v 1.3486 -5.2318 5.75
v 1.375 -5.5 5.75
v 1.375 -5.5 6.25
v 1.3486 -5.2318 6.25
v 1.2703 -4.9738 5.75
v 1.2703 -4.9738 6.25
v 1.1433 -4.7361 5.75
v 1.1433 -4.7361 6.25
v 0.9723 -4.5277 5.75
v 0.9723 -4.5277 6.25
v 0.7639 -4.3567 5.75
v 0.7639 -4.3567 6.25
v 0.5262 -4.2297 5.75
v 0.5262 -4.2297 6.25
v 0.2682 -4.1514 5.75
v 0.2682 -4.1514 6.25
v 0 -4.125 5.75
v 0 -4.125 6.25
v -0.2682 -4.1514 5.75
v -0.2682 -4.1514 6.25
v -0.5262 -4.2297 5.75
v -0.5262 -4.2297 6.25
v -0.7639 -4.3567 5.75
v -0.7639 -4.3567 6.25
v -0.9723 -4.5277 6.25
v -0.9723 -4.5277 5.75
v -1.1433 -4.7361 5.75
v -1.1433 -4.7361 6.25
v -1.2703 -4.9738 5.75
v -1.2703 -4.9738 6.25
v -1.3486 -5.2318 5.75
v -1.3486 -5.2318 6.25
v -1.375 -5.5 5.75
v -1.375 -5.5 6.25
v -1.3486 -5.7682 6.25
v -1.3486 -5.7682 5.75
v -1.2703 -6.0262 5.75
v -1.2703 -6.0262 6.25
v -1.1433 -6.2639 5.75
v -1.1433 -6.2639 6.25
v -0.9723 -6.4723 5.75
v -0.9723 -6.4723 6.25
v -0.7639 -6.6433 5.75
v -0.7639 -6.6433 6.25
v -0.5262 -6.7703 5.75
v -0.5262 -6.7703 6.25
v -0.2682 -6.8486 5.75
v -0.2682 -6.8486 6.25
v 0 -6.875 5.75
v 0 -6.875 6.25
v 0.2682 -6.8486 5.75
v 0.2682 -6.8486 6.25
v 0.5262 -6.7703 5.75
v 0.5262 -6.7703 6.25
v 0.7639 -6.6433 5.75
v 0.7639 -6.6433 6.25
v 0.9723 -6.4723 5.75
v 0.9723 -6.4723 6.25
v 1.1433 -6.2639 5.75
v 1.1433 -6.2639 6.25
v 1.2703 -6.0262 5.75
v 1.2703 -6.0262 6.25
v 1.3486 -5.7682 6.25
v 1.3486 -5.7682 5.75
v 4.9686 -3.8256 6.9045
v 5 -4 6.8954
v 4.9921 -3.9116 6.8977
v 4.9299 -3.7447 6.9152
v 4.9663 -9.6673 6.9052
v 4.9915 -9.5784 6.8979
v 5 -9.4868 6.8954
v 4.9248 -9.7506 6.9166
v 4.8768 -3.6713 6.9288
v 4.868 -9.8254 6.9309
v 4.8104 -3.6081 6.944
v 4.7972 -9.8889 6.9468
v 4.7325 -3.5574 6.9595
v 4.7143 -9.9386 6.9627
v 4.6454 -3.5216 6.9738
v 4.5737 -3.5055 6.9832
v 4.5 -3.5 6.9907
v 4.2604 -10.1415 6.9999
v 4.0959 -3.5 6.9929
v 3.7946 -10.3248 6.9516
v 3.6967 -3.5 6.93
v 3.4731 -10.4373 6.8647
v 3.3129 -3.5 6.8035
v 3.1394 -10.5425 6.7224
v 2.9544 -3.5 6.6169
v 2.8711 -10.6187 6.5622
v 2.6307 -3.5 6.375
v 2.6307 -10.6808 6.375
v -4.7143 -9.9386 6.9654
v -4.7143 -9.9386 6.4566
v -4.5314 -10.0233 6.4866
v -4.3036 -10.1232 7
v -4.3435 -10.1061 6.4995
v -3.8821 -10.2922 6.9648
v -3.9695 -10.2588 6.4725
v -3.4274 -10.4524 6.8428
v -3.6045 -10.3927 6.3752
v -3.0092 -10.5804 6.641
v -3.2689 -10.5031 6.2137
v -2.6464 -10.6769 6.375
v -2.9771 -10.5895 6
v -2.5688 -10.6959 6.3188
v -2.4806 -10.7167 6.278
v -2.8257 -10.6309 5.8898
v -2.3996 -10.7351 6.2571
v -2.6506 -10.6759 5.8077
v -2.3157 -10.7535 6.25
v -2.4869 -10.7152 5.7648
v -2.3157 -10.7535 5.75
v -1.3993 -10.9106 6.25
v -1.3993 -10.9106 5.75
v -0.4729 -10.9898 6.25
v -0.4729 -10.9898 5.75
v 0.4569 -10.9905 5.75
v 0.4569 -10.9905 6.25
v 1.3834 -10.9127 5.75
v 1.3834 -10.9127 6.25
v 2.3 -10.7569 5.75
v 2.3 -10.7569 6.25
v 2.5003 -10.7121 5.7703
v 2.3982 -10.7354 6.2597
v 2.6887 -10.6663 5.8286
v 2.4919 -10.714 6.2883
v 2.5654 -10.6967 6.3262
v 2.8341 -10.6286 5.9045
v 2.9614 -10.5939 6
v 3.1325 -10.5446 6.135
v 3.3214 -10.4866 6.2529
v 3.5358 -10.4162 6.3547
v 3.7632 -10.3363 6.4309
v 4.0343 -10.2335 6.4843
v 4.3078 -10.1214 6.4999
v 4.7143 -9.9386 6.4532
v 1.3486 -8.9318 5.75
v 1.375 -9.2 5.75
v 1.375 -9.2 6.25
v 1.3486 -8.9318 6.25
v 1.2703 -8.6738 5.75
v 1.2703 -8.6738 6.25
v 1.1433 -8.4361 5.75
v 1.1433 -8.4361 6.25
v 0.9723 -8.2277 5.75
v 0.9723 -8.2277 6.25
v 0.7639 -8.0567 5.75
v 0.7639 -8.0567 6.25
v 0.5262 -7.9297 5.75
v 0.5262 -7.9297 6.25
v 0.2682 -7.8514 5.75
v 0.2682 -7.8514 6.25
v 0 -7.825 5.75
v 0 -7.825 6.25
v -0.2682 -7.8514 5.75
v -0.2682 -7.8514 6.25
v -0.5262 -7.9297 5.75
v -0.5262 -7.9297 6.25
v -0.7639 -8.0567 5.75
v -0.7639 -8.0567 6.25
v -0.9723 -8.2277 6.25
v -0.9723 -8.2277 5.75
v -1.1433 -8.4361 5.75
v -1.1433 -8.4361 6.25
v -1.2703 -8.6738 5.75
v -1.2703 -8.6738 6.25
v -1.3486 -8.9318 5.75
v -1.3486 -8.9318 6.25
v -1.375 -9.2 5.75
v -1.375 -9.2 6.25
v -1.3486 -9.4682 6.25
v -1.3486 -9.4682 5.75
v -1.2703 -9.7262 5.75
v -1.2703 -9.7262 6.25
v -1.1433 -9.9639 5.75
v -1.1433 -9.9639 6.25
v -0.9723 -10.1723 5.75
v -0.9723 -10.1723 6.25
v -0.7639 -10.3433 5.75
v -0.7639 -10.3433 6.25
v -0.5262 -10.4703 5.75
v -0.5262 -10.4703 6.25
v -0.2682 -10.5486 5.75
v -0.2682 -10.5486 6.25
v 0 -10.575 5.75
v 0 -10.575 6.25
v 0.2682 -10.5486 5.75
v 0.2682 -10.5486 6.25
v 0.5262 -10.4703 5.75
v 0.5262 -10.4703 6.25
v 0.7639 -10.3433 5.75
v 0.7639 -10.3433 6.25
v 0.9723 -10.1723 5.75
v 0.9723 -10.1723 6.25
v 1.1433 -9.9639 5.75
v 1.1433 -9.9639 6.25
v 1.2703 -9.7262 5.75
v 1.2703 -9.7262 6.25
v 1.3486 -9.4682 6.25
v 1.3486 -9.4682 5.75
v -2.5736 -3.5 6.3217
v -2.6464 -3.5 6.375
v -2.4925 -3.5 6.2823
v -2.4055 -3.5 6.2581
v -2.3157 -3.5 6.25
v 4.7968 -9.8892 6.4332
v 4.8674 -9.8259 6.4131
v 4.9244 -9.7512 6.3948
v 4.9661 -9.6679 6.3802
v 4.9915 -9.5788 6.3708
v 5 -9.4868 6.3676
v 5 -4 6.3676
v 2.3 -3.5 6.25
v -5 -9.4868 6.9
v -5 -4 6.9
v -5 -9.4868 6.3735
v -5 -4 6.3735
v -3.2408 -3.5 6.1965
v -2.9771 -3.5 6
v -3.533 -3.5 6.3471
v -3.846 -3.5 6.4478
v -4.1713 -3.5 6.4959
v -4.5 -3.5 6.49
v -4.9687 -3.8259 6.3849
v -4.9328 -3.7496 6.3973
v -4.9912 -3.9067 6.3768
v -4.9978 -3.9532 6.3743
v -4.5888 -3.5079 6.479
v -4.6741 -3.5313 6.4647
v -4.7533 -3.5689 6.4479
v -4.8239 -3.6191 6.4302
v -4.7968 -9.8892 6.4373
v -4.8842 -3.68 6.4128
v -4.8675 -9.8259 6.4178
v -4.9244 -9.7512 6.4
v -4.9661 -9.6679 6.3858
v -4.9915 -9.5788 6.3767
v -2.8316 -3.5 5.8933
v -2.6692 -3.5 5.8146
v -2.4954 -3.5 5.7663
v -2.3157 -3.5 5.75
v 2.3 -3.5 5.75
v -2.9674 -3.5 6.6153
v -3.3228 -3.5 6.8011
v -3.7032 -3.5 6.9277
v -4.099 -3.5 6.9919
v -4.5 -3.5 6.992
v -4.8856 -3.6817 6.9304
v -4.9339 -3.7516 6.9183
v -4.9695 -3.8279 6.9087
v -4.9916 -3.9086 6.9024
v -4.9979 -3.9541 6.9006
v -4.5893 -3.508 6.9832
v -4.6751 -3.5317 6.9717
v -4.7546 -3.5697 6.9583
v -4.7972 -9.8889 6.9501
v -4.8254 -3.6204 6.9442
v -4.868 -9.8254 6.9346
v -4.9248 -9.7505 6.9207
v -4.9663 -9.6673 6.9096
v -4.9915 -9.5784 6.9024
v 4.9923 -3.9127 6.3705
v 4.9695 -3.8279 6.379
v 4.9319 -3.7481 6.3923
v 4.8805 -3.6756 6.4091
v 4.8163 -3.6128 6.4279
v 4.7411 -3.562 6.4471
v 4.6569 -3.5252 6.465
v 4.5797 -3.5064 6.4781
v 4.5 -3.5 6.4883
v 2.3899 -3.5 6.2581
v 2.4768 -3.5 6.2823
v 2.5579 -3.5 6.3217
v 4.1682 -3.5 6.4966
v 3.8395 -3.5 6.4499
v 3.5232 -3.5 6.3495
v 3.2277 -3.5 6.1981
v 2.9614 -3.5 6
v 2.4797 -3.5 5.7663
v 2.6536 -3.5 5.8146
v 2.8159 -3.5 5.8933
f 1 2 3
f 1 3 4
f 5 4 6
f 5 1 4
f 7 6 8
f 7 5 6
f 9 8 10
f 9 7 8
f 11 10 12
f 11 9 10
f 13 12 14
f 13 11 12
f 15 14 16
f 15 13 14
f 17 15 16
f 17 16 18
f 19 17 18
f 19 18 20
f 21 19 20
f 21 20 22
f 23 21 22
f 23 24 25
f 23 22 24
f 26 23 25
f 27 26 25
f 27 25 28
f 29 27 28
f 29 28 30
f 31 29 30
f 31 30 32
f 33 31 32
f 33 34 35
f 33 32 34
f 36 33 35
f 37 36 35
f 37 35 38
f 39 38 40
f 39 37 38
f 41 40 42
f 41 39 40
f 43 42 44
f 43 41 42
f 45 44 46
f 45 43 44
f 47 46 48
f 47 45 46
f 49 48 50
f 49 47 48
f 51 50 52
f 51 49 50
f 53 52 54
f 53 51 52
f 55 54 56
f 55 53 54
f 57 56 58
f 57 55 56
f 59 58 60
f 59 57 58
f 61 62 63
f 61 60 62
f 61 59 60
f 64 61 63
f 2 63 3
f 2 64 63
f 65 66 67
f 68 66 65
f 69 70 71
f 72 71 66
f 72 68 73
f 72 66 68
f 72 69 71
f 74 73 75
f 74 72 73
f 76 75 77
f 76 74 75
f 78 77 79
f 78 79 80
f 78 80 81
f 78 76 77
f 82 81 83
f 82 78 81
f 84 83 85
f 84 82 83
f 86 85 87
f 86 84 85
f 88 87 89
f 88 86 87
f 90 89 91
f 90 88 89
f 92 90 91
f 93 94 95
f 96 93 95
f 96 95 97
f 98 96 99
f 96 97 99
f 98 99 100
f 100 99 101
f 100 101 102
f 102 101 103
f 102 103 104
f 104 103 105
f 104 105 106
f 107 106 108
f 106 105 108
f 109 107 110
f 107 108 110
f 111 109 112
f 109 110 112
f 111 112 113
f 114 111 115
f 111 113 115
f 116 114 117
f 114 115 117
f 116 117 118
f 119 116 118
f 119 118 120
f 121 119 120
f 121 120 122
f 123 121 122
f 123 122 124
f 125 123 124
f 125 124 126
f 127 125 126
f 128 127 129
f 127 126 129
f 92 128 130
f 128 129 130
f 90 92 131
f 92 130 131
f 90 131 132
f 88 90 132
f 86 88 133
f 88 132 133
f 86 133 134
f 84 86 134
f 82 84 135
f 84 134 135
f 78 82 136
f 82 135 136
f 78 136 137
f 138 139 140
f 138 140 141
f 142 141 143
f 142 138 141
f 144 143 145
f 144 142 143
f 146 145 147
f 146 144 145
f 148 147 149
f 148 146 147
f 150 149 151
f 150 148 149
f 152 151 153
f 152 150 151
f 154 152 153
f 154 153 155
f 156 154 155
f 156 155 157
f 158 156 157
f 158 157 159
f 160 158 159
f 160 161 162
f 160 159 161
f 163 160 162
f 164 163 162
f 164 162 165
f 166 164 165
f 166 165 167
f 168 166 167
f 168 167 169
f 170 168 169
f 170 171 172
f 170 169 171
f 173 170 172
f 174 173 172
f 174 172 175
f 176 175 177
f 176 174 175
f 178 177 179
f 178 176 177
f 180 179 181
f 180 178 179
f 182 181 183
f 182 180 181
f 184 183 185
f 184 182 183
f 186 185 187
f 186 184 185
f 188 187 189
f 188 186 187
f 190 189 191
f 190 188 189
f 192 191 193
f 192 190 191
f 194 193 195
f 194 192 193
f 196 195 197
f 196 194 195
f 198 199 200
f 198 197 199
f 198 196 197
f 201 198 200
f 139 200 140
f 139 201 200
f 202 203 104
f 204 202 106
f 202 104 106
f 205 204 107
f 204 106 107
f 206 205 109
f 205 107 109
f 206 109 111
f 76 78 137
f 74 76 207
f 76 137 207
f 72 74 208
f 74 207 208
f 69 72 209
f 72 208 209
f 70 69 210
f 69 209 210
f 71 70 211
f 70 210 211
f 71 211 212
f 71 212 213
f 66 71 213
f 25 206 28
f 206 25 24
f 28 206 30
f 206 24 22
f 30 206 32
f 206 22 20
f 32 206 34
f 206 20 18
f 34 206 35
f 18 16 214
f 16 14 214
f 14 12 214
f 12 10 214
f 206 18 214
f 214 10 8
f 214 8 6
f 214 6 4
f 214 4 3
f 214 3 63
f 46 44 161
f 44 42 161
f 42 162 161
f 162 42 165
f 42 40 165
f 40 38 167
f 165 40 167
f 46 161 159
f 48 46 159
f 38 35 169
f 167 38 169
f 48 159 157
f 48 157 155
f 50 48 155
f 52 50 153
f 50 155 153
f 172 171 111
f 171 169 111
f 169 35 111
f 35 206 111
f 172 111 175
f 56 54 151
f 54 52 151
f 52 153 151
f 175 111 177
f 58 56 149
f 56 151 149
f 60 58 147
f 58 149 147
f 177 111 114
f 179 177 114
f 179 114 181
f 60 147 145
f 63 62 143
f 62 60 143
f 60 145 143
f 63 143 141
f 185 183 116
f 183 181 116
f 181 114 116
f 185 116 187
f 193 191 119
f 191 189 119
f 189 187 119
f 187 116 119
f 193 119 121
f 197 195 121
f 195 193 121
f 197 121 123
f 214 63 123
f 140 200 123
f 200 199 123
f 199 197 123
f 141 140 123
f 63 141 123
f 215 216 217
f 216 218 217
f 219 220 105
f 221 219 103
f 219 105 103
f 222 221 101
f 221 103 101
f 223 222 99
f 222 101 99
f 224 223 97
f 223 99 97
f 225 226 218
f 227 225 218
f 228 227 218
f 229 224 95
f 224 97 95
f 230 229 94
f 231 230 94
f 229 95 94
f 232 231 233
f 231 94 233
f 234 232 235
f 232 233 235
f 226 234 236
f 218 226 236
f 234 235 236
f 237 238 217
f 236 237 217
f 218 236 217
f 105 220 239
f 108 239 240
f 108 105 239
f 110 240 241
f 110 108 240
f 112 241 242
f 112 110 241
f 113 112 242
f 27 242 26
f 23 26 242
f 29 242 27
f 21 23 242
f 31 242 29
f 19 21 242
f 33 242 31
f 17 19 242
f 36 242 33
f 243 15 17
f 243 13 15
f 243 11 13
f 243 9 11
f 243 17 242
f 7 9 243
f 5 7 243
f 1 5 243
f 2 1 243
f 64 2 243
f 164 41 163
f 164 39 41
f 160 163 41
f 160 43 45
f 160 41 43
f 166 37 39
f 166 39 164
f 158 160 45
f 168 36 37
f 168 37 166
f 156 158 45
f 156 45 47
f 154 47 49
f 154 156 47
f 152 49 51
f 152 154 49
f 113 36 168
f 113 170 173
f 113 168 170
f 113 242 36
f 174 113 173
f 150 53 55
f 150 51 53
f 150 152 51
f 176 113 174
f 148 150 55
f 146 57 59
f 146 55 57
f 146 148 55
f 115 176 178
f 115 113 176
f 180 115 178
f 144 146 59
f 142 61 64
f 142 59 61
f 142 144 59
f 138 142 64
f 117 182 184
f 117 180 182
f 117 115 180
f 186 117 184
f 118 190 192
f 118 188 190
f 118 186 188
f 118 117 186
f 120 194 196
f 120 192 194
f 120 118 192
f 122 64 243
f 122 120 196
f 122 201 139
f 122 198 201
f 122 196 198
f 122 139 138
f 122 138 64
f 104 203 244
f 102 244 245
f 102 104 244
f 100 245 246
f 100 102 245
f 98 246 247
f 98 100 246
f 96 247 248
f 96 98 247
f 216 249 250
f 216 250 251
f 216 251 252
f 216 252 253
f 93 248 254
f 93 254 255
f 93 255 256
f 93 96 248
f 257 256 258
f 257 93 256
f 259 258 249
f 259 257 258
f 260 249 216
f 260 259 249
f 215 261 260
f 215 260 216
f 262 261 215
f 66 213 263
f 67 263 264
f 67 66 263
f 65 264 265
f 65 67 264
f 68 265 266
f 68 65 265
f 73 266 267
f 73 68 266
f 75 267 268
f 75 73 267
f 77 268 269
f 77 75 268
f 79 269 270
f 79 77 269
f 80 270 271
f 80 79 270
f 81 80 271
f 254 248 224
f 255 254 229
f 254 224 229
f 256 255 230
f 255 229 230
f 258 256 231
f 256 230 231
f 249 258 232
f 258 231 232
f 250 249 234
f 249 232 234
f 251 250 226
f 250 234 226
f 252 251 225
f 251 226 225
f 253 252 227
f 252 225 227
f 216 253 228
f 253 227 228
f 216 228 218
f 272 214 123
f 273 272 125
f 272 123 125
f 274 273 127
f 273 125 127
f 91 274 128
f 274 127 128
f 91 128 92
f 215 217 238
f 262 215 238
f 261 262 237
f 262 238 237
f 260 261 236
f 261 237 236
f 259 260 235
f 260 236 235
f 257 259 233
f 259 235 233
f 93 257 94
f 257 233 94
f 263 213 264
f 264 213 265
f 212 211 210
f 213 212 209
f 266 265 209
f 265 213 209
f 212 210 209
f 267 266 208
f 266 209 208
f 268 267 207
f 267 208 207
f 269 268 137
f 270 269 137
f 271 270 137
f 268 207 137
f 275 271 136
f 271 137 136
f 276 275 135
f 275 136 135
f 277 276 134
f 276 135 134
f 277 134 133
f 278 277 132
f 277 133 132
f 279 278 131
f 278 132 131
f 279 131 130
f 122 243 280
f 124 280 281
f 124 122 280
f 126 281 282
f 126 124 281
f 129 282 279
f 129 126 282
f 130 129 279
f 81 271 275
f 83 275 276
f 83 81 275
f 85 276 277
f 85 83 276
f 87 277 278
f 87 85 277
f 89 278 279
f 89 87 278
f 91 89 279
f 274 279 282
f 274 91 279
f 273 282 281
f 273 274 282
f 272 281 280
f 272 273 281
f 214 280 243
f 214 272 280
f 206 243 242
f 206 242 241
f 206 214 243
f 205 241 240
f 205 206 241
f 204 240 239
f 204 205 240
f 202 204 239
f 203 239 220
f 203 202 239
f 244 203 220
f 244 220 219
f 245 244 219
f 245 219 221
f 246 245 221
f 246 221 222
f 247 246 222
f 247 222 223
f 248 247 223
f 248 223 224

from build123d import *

# Parameters (mm, degrees)
PAD003_DEPTH    = 7.5
SKETCH037_W     = 13.73571
SKETCH037_H     = 11.046402
SKETCH037_R     = 1.375
POCKET020_DEPTH = 8
FILLET001_R     = 0.5


with BuildPart() as part:
    # Sketch036 (on DatumPlane) → Pad003 (new body)
    with BuildSketch(Plane.XZ.offset(11)):
        with BuildLine():
            ThreePointArc((-2.977124, 6), (-4.362654, 6.499018), (-5.714214, 5.914214))
            Line((-6.067767, 6.267767), (-5.714214, 5.914214))
            ThreePointArc((-2.646405, 6.375), (-4.378317, 6.998773), (-6.067767, 6.267767))
            ThreePointArc((-2.646405, 6.375), (-2.492463, 6.282293), (-2.315687, 6.25))
            Line((-2.315687, 6.25), (2.300007, 6.25))
            ThreePointArc((2.300007, 6.25), (2.47678, 6.282294), (2.630719, 6.375))
            ThreePointArc((6.05208, 6.267767), (4.362631, 6.998773), (2.630719, 6.375))
            Line((6.05208, 6.267767), (5.698527, 5.914214))
            ThreePointArc((5.698527, 5.914214), (4.346967, 6.499018), (2.961438, 6))
            ThreePointArc((2.3, 5.75), (2.653553, 5.814586), (2.961438, 6))
            Line((2.3, 5.75), (0, 5.75))
            Line((-2.315687, 5.75), (0, 5.75))
            ThreePointArc((-2.977124, 6), (-2.66924, 5.814586), (-2.315687, 5.75))
        make_face()
    extrude(amount=-PAD003_DEPTH)

    # Sketch037 → Pocket020 (cut)
    with BuildSketch(Plane.XY):
        with Locations((-0.219563, -6.661829)):
            Rectangle(SKETCH037_W, SKETCH037_H)
        with BuildLine():
            ThreePointArc((-4.714286, -9.938587), (0, -11), (4.714286, -9.938587))
            ThreePointArc((4.714286, -9.938587), (4.922577, -9.754094), (5, -9.486833))
            Line((5, -9.486833), (5, -3))
            ThreePointArc((5, -3), (4.853553, -2.646447), (4.5, -2.5))
            Line((4.5, -2.5), (-4.5, -2.5))
            ThreePointArc((-4.5, -2.5), (-4.853553, -2.646447), (-5, -3))
            Line((-5, -3), (-5, -9.486833))
            ThreePointArc((-5, -9.486833), (-4.922577, -9.754094), (-4.714286, -9.938587))
        make_face(mode=Mode.SUBTRACT)
        with Locations((0, -5.5)):
            Circle(SKETCH037_R)
        with Locations((0, -9.2)):
            Circle(SKETCH037_R)
    extrude(amount=POCKET020_DEPTH, mode=Mode.SUBTRACT)

    # Fillet001
    fillet001_edges = [part.edges().sort_by_distance(p)[0] for p in [
        (-5, -3.5, 6.63675),
        (5, -3.5, 6.631466),
    ]]
    fillet(fillet001_edges, radius=FILLET001_R)


solid = part.part
